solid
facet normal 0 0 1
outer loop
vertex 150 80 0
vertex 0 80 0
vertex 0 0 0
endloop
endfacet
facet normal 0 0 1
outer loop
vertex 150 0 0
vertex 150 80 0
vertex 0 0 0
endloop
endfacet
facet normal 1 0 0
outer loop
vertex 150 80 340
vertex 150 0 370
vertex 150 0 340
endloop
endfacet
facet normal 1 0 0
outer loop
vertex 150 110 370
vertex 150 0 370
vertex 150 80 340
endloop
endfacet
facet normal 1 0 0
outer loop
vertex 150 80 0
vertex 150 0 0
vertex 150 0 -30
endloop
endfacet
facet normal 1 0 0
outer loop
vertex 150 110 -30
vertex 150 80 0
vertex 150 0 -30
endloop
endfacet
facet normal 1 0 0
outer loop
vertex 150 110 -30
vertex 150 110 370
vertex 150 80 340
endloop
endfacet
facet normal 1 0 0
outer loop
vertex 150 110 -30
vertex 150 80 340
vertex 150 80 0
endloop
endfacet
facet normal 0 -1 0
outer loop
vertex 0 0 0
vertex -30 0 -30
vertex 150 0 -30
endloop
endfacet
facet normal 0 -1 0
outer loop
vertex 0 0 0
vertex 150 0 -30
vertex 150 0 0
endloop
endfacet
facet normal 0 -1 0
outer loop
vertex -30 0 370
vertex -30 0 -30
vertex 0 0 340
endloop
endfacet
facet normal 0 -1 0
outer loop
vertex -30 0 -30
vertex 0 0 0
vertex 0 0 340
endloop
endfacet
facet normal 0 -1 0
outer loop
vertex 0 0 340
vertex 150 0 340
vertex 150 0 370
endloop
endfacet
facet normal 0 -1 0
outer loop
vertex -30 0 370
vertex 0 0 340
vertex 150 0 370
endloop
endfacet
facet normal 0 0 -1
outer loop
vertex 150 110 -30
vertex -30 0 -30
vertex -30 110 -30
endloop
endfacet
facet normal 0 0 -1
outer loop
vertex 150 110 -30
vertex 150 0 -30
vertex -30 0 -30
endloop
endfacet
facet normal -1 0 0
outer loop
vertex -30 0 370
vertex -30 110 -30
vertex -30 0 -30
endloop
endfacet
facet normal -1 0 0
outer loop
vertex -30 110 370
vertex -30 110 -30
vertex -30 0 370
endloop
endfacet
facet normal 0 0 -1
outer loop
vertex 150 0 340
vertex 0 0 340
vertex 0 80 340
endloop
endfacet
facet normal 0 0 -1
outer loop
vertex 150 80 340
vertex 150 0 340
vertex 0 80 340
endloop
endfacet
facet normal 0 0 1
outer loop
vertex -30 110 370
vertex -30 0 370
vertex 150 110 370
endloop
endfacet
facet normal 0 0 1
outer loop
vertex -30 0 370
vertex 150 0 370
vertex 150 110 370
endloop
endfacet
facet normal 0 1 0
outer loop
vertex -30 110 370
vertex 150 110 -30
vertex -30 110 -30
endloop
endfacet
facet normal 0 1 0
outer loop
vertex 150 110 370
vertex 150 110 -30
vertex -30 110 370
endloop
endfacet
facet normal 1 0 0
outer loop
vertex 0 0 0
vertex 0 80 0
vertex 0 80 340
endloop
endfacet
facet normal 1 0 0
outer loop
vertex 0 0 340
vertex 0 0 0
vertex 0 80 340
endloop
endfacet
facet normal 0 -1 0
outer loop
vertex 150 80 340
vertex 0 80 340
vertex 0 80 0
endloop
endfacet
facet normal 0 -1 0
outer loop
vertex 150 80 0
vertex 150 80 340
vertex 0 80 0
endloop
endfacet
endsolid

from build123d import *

# Parameters (mm, degrees)
BOSS_EXTRU_1_DEPTH = 150
ESQUISSE2_W        = 400
ESQUISSE2_H        = 110
BOSS_EXTRU_2_DEPTH = 30


with BuildPart() as part:
    # Esquisse1 → Boss.-Extru.1 (new body)
    with BuildSketch(Plane(origin=(0, 0, 0), x_dir=(0, 0, -1), z_dir=(1, 0, 0))):
        Polygon((0, 80), (0, 0), (30, 0), (30, 110), (-370, 110), (-370, 0), (-340, 0), (-340, 80), align=None)
    extrude(amount=BOSS_EXTRU_1_DEPTH)

    # Esquisse2 → Boss.-Extru.2 (add)
    with BuildSketch(Plane.ZY):
        with Locations((170, 55)):
            Rectangle(ESQUISSE2_W, ESQUISSE2_H)
    extrude(amount=BOSS_EXTRU_2_DEPTH)


solid = part.part
